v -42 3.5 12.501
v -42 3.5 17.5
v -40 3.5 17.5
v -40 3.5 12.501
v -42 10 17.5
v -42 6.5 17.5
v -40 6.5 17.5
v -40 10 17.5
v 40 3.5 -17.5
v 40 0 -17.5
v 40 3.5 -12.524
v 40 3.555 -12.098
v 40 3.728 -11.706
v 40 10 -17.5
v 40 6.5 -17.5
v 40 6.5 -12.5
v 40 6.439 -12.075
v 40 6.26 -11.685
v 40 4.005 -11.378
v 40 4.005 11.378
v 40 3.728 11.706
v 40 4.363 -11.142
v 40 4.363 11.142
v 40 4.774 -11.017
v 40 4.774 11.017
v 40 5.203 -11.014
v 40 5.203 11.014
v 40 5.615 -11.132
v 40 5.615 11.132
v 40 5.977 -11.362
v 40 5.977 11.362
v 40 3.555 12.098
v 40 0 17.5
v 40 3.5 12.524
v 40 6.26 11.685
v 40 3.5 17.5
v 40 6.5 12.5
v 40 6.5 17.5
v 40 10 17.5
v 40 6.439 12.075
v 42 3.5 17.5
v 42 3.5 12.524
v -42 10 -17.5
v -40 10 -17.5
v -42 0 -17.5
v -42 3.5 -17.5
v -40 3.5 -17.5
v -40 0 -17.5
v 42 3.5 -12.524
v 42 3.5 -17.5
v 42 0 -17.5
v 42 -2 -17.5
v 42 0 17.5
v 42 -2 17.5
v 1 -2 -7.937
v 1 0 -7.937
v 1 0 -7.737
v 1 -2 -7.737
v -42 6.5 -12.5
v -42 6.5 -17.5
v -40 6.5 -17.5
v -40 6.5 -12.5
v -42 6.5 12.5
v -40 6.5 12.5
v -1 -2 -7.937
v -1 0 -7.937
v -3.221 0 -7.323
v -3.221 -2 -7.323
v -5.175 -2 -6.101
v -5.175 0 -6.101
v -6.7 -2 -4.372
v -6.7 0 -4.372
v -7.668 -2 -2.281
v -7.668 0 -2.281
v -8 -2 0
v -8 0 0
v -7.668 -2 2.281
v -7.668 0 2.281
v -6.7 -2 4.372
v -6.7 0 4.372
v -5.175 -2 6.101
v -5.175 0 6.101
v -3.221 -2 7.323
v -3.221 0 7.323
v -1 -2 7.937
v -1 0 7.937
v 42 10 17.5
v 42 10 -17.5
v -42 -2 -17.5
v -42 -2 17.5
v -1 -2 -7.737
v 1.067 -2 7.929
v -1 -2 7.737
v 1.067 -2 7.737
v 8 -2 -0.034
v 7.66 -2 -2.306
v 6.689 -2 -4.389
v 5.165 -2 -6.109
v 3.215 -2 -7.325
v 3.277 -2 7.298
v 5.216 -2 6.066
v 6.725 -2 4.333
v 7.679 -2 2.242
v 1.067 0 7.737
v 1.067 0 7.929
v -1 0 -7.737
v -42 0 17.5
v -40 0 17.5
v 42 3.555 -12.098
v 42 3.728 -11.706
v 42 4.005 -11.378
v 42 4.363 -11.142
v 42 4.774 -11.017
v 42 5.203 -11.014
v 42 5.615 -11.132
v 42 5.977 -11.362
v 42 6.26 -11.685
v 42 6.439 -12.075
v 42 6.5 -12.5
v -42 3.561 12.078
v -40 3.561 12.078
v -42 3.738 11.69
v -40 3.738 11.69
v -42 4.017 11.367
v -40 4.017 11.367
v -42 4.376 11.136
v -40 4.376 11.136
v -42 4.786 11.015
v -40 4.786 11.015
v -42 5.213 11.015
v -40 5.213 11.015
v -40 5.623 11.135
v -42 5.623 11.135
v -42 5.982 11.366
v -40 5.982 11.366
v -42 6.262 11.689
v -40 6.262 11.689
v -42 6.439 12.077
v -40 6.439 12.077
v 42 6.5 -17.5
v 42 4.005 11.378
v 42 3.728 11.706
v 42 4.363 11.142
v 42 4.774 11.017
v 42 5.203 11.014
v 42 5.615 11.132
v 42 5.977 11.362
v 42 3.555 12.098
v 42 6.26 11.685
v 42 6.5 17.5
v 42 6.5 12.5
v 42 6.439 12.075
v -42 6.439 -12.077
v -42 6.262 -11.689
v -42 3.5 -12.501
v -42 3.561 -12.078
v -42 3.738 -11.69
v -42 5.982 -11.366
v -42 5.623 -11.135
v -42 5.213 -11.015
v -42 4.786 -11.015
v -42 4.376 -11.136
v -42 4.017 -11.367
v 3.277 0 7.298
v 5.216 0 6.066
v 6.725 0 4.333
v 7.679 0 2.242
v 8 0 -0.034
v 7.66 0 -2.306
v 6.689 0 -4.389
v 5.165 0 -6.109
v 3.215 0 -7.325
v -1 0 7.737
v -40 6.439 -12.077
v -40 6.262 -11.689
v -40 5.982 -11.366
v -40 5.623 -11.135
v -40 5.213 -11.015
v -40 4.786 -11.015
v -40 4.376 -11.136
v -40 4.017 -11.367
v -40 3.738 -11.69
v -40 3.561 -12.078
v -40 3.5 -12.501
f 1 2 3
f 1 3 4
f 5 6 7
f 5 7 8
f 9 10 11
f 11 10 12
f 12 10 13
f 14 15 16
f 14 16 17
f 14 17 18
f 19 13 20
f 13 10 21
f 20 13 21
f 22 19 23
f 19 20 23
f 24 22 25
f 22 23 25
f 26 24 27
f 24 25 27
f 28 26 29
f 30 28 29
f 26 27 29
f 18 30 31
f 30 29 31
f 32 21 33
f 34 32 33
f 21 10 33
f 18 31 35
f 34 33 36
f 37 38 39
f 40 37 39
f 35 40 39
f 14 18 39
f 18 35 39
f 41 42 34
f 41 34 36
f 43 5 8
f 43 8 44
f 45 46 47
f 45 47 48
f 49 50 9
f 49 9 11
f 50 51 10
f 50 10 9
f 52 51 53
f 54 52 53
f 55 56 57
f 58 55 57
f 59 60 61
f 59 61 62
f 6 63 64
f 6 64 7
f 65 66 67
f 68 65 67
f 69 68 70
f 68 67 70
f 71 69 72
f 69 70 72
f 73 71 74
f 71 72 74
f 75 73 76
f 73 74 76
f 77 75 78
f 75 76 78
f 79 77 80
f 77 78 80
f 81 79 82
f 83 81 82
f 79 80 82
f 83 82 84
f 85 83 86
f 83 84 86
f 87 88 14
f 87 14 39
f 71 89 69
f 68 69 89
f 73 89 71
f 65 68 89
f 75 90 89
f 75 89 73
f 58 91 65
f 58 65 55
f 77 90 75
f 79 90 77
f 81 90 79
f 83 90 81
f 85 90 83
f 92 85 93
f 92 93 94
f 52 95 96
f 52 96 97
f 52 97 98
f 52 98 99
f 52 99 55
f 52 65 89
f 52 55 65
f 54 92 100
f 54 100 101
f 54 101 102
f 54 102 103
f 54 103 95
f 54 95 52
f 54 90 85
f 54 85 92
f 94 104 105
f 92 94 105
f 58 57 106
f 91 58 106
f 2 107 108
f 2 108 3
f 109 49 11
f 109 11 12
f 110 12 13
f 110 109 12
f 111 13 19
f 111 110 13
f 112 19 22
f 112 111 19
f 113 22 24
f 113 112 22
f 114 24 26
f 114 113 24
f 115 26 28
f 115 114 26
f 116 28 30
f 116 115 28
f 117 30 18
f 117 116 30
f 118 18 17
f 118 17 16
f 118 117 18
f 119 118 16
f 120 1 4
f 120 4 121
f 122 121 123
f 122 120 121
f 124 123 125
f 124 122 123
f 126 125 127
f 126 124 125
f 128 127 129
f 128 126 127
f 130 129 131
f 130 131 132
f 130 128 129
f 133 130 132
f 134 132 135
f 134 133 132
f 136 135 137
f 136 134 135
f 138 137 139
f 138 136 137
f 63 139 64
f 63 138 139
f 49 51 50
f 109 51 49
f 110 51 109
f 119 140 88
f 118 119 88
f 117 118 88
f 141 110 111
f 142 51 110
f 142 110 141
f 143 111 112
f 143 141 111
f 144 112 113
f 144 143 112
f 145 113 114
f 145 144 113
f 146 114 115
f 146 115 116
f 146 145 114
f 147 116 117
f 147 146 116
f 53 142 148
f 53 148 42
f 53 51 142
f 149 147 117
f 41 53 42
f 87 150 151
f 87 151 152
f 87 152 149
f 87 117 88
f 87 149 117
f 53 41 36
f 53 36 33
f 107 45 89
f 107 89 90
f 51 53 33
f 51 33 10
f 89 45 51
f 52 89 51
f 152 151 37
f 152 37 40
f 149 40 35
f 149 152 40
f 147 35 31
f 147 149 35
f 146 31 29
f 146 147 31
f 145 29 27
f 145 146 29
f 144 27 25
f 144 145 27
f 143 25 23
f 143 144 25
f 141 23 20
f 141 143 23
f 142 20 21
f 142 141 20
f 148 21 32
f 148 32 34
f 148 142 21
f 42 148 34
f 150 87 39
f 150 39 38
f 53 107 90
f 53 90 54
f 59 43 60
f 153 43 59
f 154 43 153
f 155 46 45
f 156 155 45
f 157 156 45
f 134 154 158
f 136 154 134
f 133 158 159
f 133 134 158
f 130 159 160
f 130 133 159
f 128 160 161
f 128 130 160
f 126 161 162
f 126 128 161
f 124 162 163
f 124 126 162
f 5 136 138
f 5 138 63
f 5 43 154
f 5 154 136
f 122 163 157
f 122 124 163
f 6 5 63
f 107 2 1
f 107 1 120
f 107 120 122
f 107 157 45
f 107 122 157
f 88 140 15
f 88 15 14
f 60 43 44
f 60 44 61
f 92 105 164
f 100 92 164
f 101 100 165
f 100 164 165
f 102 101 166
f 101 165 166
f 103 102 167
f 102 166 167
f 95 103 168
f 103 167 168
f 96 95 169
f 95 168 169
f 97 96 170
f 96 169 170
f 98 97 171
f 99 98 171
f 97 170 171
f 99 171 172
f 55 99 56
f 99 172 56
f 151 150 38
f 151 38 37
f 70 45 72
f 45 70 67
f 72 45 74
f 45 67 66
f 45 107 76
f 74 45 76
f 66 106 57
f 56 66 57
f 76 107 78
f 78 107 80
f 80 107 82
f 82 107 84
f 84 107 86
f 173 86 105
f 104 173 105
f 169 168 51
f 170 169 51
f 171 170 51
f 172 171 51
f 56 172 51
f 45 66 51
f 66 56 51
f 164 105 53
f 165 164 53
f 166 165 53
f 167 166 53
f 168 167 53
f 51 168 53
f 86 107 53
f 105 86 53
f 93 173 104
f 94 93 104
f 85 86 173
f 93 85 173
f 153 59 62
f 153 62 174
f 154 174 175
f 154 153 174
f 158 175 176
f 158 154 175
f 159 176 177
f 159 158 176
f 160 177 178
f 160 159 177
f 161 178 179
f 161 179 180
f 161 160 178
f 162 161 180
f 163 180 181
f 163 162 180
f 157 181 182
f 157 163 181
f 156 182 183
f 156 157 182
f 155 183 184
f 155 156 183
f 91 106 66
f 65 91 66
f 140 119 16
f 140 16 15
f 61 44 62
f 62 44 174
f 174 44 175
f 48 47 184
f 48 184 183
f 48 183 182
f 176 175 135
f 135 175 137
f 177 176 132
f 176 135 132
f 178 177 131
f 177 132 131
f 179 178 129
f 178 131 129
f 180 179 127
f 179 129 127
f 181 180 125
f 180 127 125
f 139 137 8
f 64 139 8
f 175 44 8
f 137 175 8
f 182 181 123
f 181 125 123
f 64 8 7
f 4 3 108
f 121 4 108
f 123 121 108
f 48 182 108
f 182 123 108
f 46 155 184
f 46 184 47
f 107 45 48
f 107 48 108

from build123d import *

# Parameters (mm, degrees)
F0_W     = 84
F0_H     = 35
F1_DEPTH = 2
F3_DEPTH = 2
F5_DEPTH = 2


with BuildPart() as f1:
    # F0 (on Front) → F1 (new body)
    with BuildSketch(Plane.XZ):
        Rectangle(F0_W, F0_H)
        with BuildLine():
            ThreePointArc((-1, -7.937254), (-8, 0), (-1, 7.937254))
            Line((-1, 7.937254), (-1, 7.737254))
            Line((-1, 7.737254), (1.066667, 7.737254))
            Line((1.066667, 7.737254), (1.066667, 7.92857))
            ThreePointArc((1.066667, 7.92857), (7.999929, -0.033615), (1, -7.937254))
            Line((1, -7.937254), (1, -7.737254))
            Line((1, -7.737254), (-1, -7.737254))
            Line((-1, -7.737254), (-1, -7.937254))
        make_face(mode=Mode.SUBTRACT)
    extrude(amount=F1_DEPTH)


with BuildPart() as f3:
    # F2 (on face) → F3 (new body)
    with BuildSketch(Plane.YZ.offset(42)):
        with BuildLine():
            Line((3.500194, 17.5), (0, 17.5))
            Line((0, 17.5), (0, -17.5))
            Line((0, -17.5), (3.500194, -17.5))
            Line((3.500194, -17.5), (3.500194, -12.524109))
            ThreePointArc((3.500194, -12.524109), (4.987945, -11.000048), (6.5, -12.5))
            Line((6.5, -12.5), (6.5, -17.5))
            Line((6.5, -17.5), (10, -17.5))
            Line((10, -17.5), (10, 17.5))
            Line((10, 17.5), (6.5, 17.5))
            Line((6.5, 17.5), (6.5, 12.5))
            ThreePointArc((6.5, 12.5), (4.987945, 11.000048), (3.500194, 12.524109))
            Line((3.500194, 12.524109), (3.500194, 17.5))
        make_face()
    extrude(amount=-F3_DEPTH)


with BuildPart() as f5:
    # F4 (on face) → F5 (new body)
    with BuildSketch(Plane(origin=(-42, 0, 0), x_dir=(0, -1, 0), z_dir=(-1, 0, 0))):
        with BuildLine():
            Line((-6.5, 17.5), (-10, 17.5))
            Line((-10, 17.5), (-10, -17.5))
            Line((-10, -17.5), (-6.5, -17.5))
            Line((-6.5, -17.5), (-6.5, -12.5))
            ThreePointArc((-6.5, -12.5), (-4.999641, -11), (-3.5, -12.500718))
            Line((-3.5, -12.500718), (-3.5, -17.5))
            Line((-3.5, -17.5), (0, -17.5))
            Line((0, -17.5), (0, 17.5))
            Line((0, 17.5), (-3.5, 17.5))
            Line((-3.5, 17.5), (-3.5, 12.500718))
            ThreePointArc((-3.5, 12.500718), (-4.999641, 11), (-6.5, 12.5))
            Line((-6.5, 12.5), (-6.5, 17.5))
        make_face()
    extrude(amount=-F5_DEPTH)


solid = Compound([f1.part, f3.part, f5.part])
